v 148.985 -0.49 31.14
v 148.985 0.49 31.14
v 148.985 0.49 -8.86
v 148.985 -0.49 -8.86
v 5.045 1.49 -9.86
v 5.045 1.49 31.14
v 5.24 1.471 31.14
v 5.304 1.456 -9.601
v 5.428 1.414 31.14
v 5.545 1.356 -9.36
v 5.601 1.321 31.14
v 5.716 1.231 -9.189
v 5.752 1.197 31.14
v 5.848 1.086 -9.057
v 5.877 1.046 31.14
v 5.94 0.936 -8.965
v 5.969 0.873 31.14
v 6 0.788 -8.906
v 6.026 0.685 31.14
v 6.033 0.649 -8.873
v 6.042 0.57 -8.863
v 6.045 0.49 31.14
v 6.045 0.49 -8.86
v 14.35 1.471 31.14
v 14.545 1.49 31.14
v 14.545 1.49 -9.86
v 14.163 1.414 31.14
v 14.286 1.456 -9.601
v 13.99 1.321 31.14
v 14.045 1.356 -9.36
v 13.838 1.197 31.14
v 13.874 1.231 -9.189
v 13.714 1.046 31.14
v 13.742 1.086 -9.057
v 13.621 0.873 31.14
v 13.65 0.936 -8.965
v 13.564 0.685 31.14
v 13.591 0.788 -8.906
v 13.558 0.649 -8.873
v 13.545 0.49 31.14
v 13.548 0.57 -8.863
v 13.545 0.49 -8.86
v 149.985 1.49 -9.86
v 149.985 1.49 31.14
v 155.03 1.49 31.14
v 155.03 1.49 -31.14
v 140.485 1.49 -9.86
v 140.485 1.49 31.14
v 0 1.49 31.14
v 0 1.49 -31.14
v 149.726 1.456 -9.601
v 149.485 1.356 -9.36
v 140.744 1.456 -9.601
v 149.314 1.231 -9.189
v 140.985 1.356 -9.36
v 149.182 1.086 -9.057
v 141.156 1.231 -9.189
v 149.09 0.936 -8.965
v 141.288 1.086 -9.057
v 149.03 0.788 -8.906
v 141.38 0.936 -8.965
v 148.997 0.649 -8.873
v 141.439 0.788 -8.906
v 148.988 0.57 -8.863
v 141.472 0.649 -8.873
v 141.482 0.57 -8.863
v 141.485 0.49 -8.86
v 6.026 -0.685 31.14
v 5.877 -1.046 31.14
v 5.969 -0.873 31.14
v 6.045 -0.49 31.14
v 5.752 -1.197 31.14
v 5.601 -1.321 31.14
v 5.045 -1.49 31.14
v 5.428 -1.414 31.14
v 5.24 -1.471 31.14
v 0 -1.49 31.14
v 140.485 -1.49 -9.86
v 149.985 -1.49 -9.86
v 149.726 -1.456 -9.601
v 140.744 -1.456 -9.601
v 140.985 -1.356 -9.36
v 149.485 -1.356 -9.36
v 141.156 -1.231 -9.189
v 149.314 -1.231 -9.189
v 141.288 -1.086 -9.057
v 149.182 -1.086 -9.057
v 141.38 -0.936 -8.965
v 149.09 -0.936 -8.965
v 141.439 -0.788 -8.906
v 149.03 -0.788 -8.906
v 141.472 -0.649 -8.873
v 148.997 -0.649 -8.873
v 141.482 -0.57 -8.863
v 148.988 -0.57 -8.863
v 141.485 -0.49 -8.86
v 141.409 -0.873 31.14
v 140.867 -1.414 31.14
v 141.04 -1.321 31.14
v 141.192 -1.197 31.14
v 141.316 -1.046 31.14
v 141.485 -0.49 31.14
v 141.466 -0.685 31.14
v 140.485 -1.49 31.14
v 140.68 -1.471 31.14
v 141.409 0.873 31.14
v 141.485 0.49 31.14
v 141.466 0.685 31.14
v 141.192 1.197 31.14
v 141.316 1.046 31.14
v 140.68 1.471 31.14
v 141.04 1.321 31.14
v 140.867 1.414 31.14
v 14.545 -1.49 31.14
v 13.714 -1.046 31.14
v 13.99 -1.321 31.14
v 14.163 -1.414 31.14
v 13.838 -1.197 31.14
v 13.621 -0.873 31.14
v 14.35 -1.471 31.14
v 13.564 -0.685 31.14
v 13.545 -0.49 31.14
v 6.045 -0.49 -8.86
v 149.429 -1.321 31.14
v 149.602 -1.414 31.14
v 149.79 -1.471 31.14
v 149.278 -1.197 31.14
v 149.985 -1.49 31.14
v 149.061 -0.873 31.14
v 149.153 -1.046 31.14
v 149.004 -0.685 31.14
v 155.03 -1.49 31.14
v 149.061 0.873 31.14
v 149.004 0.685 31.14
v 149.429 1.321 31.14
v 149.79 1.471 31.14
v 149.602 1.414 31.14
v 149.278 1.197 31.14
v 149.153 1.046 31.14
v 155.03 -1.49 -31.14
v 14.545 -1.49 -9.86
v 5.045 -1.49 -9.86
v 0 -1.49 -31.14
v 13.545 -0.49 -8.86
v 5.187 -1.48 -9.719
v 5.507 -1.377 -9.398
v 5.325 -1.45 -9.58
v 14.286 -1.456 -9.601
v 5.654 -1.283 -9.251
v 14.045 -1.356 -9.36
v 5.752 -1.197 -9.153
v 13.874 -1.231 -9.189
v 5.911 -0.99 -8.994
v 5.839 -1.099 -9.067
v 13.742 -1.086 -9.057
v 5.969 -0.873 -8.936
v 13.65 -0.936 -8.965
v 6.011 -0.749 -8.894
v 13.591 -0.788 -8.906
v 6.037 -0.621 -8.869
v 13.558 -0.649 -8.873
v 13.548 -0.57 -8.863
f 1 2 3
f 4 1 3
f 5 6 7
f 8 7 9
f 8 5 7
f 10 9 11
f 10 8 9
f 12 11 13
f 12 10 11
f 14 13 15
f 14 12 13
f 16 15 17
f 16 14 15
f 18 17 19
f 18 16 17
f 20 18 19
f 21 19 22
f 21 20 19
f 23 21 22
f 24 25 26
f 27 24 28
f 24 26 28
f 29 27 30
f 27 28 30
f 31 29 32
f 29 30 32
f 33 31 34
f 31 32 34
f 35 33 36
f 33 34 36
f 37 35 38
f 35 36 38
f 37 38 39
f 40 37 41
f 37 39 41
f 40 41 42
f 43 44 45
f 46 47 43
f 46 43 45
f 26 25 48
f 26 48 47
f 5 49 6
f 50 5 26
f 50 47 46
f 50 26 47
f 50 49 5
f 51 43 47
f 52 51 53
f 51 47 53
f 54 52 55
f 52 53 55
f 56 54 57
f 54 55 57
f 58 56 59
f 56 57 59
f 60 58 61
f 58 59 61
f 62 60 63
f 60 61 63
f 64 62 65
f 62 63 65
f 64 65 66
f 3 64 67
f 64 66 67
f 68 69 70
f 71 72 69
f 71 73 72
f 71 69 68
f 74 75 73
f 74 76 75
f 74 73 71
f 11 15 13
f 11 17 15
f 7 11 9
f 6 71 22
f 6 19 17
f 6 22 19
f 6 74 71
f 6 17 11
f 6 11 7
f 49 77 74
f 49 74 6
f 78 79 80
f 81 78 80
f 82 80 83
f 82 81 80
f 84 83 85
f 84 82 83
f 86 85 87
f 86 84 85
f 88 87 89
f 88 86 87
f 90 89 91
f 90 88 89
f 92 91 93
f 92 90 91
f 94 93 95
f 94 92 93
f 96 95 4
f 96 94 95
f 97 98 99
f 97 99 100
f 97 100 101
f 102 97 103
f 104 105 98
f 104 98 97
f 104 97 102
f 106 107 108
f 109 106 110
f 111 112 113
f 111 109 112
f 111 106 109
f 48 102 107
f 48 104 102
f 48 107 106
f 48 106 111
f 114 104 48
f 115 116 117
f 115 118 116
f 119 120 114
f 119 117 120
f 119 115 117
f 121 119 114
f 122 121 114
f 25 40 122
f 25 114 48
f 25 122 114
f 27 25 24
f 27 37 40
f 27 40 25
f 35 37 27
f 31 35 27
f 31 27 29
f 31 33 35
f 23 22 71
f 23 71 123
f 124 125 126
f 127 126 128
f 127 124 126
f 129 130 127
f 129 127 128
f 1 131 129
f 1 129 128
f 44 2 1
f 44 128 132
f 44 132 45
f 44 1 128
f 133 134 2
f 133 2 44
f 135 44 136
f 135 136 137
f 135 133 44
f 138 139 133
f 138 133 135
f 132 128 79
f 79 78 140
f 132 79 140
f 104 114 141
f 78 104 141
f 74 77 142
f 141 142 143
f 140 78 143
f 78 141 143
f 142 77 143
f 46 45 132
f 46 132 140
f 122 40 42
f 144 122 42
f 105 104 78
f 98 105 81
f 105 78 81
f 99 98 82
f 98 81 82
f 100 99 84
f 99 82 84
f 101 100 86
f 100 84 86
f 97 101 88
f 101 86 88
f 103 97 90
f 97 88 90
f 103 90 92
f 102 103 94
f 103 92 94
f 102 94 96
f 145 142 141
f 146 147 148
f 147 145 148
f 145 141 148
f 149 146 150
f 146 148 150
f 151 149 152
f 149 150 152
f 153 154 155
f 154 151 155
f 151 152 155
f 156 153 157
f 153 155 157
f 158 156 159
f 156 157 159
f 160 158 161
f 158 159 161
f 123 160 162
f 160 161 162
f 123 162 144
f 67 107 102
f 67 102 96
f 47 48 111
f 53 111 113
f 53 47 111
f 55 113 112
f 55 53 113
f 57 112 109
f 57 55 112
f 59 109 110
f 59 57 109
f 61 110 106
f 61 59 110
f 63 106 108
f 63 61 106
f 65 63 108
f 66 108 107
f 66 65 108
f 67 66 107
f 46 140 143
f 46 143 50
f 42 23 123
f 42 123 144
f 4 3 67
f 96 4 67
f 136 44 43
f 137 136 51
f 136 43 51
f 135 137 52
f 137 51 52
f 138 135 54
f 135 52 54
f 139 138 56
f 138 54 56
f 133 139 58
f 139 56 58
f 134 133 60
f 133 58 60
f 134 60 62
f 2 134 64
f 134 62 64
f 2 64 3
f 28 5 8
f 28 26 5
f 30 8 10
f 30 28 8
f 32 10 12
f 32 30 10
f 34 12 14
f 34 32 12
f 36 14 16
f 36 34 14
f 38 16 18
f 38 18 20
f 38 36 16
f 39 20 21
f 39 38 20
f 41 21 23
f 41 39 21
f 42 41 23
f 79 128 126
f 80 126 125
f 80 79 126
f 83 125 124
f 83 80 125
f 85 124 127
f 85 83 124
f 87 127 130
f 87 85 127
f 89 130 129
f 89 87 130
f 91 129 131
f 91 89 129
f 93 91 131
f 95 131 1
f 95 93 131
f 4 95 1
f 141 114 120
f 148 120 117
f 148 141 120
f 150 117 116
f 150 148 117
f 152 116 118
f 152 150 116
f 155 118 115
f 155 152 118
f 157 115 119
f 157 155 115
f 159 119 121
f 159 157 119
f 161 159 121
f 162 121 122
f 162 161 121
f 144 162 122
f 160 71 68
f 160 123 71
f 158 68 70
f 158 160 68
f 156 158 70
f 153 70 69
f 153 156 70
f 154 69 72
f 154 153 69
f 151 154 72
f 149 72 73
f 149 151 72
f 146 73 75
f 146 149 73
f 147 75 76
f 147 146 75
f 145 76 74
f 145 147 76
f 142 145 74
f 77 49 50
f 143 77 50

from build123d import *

# Parameters (mm, degrees)
SKETCH1_W            = 62.28
SKETCH1_H            = 2.98
BOSS_EXTRUDE1_DEPTH  = 155.03
SKETCH2_W            = 7.5
SKETCH2_H            = 40
CUT_EXTRUDE1_DEPTH   = 159.154610745
FILLET1_R            = 1
FILLET1_OF_MIRROR1_R = 1


with BuildPart() as part:
    # Sketch1 → Boss-Extrude1 (new body)
    with BuildSketch(Plane(origin=(0, 0, 0), x_dir=(0, 0, -1), z_dir=(1, 0, 0))):
        Rectangle(SKETCH1_W, SKETCH1_H)
    extrude(amount=BOSS_EXTRUDE1_DEPTH)

    # Sketch2 → Cut-Extrude1 (cut, through all)
    with BuildSketch(Plane(origin=(0, 1.49, 0), x_dir=(1, 0, 0), z_dir=(0, 1, 0))):
        with Locations((9.795259857, -11.14)):
            Rectangle(SKETCH2_W, SKETCH2_H)
    cut_extrude1 = extrude(amount=-CUT_EXTRUDE1_DEPTH, mode=Mode.SUBTRACT)

    # Fillet1
    fillet1_edges = [part.edges().sort_by_distance(p)[0] for p in [
        (13.545259857, -1.49, 11.14),
        (6.045259857, -1.49, 11.14),
        (9.795259857, -1.49, -8.86),
        (13.545259857, 1.49, 11.14),
        (9.795259857, 1.49, -8.86),
        (6.045259857, 1.49, 11.14),
    ]]
    fillet(fillet1_edges, radius=FILLET1_R)

    # Mirror1: Cut-Extrude1 across plane
    add(cut_extrude1.mirror(Plane(origin=(77.515, 0, 0), x_dir=(0, 0, 1), z_dir=(1, 0, 0))), mode=Mode.SUBTRACT)

    # Fillet1 of Mirror1
    fillet1_of_mirror1_edges = [part.edges().sort_by_distance(p)[0] for p in [
        (141.484740143, -1.49, 11.14),
        (148.984740143, -1.49, 11.14),
        (145.234740143, -1.49, -8.86),
        (141.484740143, 1.49, 11.14),
        (145.234740143, 1.49, -8.86),
        (148.984740143, 1.49, 11.14),
    ]]
    fillet(fillet1_of_mirror1_edges, radius=FILLET1_OF_MIRROR1_R)


solid = part.part
